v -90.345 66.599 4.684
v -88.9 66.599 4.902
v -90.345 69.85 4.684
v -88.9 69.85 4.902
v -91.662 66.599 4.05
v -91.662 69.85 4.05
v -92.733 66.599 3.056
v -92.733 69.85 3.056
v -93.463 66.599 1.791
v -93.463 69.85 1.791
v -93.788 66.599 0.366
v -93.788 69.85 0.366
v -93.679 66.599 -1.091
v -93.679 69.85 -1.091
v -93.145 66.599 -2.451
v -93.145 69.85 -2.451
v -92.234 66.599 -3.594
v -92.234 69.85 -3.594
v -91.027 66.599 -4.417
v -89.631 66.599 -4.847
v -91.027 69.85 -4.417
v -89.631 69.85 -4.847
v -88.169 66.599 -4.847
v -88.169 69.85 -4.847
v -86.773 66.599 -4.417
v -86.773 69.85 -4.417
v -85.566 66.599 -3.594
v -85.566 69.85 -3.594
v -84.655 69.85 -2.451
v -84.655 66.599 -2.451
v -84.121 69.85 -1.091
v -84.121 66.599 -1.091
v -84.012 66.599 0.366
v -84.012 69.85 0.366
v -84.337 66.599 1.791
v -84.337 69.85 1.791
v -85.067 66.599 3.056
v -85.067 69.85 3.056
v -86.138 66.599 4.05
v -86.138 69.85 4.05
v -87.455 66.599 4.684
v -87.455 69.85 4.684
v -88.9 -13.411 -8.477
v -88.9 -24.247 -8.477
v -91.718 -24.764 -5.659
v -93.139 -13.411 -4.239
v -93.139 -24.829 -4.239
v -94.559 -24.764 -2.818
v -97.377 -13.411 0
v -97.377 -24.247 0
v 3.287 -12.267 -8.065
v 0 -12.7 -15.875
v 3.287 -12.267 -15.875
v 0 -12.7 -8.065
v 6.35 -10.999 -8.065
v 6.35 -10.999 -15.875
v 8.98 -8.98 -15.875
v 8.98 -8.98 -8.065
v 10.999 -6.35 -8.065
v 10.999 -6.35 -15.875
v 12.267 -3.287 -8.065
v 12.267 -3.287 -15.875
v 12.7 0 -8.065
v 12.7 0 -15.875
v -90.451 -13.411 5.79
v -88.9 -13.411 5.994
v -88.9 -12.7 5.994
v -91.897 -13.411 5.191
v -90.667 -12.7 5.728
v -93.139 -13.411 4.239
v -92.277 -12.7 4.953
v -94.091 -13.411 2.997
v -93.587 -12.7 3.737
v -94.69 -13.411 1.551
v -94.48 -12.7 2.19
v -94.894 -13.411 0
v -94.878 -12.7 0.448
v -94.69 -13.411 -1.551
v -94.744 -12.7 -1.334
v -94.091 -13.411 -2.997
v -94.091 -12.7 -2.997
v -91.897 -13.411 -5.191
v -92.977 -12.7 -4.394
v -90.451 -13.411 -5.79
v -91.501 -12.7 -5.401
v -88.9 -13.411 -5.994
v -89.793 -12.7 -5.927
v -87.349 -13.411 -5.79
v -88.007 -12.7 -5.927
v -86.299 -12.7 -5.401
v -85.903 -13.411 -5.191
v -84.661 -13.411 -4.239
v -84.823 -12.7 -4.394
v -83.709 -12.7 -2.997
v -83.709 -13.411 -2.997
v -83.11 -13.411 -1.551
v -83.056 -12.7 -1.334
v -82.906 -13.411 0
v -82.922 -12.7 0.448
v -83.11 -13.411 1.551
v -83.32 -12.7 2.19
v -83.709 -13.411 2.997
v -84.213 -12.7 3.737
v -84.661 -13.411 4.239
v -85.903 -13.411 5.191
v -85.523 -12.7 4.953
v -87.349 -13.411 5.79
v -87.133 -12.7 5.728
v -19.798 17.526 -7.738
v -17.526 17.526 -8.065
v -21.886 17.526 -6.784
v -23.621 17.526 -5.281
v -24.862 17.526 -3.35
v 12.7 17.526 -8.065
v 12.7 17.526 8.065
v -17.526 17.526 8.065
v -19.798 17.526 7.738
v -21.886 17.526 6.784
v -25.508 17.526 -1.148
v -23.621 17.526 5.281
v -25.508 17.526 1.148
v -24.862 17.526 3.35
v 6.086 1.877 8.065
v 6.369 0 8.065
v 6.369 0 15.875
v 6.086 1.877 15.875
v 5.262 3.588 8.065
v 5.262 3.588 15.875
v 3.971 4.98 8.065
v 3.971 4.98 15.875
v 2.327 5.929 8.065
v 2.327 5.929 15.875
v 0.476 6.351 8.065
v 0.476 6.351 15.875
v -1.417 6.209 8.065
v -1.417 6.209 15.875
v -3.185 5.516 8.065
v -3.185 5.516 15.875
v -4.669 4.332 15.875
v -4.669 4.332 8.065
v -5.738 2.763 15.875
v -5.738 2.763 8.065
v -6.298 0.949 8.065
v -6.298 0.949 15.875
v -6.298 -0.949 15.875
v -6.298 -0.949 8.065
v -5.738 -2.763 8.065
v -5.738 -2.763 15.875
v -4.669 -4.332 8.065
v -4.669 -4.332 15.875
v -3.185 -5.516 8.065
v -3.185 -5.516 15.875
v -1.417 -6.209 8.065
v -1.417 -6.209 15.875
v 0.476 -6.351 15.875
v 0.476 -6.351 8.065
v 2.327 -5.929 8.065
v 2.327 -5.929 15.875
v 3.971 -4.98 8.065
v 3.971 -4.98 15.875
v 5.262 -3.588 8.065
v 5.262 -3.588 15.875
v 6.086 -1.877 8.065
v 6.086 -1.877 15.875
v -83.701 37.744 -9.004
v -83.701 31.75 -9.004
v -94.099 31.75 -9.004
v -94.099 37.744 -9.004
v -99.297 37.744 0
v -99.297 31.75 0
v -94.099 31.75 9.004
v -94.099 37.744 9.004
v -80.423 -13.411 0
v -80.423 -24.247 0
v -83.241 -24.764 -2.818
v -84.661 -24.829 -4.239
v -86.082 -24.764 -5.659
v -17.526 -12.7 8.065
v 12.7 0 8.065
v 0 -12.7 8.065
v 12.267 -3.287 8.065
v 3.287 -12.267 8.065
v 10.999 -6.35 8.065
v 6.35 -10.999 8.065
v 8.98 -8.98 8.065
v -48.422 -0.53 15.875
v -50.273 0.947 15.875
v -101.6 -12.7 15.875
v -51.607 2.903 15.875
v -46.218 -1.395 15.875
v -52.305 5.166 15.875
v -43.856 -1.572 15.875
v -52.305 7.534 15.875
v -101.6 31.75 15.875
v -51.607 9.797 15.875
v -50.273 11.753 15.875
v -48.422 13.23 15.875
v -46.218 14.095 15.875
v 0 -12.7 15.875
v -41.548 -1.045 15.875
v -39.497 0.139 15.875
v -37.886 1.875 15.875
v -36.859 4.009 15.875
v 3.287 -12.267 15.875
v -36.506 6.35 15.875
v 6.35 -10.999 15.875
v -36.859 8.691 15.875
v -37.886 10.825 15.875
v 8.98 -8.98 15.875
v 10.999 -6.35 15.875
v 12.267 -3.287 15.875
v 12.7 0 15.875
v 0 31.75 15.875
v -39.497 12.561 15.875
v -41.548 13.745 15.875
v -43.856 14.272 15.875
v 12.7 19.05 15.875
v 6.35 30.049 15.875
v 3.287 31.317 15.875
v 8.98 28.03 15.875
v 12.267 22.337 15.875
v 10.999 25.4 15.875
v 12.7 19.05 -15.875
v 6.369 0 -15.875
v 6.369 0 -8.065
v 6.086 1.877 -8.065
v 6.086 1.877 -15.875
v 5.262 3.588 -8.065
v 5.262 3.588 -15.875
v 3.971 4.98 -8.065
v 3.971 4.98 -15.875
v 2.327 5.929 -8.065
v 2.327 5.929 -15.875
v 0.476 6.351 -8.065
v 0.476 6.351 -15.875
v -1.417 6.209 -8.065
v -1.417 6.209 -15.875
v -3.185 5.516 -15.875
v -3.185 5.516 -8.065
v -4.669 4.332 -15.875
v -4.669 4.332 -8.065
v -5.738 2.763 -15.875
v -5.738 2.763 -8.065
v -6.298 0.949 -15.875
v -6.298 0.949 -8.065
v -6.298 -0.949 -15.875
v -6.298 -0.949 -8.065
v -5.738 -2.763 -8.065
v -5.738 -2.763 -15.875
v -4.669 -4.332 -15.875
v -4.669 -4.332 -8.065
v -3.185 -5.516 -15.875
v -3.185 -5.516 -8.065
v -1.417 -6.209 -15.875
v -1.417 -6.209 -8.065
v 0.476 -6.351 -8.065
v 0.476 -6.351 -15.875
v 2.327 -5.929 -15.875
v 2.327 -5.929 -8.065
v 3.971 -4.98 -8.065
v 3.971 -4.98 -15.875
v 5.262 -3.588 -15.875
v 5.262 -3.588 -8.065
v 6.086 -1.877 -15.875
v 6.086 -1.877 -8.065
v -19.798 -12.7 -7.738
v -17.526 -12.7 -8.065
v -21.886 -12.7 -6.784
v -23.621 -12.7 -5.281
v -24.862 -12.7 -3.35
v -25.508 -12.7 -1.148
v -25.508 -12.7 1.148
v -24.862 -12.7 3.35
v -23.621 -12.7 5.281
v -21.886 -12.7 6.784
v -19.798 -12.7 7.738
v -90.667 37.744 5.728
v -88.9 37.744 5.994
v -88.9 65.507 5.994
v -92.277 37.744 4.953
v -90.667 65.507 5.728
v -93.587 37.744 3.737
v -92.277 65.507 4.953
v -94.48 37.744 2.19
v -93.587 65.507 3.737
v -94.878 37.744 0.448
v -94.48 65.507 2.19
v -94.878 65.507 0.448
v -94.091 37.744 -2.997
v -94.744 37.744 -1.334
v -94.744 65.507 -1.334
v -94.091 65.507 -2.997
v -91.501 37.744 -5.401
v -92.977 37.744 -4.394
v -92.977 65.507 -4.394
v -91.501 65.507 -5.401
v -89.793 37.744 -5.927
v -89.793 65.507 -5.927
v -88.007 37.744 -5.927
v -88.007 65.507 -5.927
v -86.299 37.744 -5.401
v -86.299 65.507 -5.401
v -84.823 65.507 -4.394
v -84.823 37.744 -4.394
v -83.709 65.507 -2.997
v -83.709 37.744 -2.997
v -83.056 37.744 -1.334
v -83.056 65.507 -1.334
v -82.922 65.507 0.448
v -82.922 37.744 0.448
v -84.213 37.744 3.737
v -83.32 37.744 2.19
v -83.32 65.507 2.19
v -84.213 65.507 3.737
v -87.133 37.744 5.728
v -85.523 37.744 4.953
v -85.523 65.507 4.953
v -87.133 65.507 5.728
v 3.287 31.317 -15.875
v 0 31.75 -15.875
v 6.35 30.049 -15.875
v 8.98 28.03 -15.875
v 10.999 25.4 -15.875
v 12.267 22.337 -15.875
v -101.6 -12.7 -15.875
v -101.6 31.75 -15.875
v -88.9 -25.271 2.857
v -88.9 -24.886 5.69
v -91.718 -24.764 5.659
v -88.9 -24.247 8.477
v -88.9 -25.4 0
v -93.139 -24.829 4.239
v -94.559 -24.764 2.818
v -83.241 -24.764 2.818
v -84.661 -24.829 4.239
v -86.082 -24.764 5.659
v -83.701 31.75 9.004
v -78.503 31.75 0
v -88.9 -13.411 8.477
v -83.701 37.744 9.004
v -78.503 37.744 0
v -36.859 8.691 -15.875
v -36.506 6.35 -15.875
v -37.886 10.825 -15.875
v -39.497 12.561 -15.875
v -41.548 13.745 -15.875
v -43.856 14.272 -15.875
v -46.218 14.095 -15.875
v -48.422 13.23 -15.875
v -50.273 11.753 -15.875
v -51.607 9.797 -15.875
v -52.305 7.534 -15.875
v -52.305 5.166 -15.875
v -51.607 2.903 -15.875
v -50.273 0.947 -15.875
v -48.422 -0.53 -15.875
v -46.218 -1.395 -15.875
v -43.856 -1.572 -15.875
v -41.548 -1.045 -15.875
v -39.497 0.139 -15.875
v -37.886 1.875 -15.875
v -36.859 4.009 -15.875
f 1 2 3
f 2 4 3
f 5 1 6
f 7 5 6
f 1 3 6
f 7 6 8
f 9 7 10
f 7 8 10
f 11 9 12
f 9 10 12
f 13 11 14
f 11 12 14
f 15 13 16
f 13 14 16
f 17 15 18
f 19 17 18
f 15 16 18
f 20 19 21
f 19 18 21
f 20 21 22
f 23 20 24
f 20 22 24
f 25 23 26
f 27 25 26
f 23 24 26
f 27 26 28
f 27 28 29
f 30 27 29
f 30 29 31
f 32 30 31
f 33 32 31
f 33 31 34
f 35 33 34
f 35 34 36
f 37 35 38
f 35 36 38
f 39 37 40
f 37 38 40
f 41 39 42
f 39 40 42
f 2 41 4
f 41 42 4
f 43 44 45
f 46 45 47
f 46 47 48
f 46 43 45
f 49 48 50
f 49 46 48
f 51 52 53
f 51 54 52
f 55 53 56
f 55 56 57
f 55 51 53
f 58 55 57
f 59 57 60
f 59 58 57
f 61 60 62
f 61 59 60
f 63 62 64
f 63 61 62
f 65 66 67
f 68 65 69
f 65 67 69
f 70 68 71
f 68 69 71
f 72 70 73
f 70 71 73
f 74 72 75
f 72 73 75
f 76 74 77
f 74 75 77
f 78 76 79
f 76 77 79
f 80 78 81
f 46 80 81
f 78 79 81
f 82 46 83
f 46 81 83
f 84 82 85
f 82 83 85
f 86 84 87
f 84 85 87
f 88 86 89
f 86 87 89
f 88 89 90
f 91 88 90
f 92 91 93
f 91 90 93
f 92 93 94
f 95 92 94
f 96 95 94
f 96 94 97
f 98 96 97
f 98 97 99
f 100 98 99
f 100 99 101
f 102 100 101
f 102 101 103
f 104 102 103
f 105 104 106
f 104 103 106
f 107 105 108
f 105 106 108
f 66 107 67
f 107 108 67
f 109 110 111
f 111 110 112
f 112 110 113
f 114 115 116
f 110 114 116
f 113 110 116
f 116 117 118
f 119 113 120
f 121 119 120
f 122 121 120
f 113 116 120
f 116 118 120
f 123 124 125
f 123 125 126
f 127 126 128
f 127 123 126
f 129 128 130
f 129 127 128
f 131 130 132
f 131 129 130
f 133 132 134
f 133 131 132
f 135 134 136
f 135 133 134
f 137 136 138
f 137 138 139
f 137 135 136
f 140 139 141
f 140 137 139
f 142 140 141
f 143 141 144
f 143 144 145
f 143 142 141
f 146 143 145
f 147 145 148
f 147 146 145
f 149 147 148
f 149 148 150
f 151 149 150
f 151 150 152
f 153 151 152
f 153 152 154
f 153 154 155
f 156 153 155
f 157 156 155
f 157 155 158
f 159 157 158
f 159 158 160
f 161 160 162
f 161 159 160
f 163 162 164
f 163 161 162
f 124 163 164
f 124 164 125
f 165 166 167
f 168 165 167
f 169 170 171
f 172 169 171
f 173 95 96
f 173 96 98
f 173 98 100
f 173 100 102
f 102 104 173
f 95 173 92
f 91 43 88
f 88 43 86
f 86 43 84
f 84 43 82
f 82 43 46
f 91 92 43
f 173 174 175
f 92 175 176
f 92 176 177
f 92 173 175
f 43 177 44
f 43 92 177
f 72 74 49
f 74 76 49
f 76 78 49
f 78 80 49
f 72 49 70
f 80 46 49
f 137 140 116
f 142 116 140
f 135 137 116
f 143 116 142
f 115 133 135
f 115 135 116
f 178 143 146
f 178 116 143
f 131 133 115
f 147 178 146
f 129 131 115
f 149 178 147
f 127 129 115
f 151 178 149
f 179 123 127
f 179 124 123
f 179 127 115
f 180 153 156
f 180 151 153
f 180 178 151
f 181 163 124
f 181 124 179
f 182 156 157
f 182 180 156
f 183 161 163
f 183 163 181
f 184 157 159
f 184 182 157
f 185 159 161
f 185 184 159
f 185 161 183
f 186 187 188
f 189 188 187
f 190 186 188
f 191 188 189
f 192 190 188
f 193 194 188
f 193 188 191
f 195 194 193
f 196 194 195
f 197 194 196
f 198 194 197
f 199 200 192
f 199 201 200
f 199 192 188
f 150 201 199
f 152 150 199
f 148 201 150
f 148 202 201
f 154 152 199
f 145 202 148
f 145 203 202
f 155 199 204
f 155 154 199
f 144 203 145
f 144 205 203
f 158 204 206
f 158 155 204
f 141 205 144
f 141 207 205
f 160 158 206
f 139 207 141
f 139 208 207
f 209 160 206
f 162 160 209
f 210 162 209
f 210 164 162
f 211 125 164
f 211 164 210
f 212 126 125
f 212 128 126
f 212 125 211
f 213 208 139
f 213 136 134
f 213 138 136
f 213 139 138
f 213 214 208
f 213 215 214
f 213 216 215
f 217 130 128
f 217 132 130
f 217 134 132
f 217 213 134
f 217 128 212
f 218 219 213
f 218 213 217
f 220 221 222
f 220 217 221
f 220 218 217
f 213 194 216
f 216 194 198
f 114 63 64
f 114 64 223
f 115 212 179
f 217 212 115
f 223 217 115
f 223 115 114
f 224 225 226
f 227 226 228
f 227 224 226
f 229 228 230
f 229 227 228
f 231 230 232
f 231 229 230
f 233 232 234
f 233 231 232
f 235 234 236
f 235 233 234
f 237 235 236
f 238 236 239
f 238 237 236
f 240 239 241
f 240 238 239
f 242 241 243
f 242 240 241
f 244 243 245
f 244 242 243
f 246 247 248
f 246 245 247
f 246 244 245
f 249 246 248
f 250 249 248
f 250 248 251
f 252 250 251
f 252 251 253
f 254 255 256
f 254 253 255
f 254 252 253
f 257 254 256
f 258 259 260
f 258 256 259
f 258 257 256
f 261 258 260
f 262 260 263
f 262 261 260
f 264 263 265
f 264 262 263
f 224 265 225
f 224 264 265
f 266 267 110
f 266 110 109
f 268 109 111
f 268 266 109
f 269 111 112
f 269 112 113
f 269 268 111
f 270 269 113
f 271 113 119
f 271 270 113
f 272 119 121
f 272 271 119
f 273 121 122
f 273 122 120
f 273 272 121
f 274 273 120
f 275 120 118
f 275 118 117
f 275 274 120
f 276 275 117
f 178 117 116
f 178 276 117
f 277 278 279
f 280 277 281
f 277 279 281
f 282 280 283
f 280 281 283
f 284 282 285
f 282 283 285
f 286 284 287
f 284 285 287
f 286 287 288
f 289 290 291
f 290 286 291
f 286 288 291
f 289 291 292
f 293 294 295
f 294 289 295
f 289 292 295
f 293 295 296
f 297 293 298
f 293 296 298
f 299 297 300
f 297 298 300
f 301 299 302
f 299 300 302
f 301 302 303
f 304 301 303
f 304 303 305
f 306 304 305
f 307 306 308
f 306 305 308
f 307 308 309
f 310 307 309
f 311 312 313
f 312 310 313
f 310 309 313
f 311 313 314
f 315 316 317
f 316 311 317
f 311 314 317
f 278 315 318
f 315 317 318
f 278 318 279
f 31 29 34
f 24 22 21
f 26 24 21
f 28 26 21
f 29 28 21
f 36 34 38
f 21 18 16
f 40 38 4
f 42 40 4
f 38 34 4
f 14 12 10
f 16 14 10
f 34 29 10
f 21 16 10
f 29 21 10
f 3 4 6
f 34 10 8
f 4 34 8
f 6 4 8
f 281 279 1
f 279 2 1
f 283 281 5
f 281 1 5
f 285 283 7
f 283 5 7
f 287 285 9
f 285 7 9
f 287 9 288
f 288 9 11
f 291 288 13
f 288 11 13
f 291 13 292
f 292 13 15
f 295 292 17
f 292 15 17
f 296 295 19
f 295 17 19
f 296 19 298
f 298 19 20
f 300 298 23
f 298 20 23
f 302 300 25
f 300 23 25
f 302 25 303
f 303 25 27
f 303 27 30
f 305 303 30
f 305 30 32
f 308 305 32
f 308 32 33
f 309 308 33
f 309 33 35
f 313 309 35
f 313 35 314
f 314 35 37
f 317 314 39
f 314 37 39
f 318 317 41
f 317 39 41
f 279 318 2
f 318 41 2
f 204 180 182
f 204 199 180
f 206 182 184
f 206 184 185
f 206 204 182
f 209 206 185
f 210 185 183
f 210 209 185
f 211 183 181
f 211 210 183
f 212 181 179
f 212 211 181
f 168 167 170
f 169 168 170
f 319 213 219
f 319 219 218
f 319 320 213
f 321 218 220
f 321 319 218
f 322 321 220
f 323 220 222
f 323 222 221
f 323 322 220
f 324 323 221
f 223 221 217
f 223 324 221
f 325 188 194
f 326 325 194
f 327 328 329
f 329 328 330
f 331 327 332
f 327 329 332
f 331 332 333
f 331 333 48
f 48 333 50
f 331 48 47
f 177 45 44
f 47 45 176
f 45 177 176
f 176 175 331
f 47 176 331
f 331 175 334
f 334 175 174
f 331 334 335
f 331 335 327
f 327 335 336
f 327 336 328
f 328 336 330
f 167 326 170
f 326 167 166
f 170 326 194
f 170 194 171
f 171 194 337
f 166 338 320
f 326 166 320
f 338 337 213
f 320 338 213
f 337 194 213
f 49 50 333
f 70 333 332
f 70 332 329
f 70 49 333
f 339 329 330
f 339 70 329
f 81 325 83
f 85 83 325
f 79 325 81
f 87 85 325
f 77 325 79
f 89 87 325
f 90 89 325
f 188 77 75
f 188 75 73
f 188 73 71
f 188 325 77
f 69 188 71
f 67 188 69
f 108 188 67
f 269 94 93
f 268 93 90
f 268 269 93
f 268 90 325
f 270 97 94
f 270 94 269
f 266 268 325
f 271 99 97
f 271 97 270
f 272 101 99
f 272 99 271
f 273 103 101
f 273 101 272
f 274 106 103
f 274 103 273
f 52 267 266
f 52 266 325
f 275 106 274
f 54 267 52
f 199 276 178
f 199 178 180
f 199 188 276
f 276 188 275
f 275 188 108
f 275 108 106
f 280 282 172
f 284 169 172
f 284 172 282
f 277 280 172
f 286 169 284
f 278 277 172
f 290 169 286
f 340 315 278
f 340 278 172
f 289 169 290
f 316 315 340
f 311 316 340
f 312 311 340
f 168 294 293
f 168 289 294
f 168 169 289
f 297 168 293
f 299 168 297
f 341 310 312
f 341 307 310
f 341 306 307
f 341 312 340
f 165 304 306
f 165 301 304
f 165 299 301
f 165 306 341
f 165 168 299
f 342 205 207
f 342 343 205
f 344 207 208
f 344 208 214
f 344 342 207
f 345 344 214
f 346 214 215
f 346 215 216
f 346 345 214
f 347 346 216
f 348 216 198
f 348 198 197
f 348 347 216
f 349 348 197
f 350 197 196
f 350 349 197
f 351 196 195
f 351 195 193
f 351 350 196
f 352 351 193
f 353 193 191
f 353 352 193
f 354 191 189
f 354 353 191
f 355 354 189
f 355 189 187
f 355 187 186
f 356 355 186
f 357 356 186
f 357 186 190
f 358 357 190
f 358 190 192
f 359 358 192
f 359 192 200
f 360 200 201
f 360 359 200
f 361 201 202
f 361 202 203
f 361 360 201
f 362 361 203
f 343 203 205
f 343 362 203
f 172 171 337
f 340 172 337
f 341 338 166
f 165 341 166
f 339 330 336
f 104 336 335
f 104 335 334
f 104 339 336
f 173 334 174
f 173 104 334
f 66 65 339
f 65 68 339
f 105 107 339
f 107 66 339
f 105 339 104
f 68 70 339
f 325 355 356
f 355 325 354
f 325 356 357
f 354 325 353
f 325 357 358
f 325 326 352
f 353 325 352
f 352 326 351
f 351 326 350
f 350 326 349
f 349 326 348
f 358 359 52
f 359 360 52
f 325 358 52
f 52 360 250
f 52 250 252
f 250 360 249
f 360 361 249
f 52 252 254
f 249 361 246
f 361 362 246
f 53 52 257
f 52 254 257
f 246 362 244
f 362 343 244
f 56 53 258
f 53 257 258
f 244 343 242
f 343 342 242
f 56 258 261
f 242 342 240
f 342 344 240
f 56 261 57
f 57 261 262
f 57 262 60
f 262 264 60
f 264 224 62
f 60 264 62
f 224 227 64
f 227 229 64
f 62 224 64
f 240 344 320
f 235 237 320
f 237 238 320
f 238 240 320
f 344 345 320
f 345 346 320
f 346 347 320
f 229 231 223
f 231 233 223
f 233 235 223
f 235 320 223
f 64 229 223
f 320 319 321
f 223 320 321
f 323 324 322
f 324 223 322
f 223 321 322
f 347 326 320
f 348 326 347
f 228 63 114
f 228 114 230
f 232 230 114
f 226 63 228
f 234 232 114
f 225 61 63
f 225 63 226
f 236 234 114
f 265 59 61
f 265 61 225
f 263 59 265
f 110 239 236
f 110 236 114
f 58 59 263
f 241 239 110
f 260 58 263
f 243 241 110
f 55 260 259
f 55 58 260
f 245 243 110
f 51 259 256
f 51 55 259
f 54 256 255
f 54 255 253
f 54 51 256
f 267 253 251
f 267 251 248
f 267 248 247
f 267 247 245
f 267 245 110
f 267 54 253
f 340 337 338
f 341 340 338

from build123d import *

# Parameters (mm, degrees)
SKETCH11_W         = 114.3
SKETCH11_H         = 44.45
SKETCH11_R         = 6.36905
SKETCH11_R_2       = 7.94385
EXTRUDE3_DEPTH     = 15.875
CUT_EXTRUDE1_DEPTH = 30.226
FILLET1_R          = 12.7
EXTRUDE4_DEPTH     = 5.9944
SKETCH15_R         = 24.22520922
CUT_EXTRUDE2_DEPTH = 12.9888


with BuildPart() as part:
    # Sketch11 → Extrude3 (new body, symmetric)
    with BuildSketch(Plane.XY):
        with Locations((-44.45, 9.525)):
            Rectangle(SKETCH11_W, SKETCH11_H)
        Circle(SKETCH11_R, mode=Mode.SUBTRACT)
        with Locations((-44.45, 6.35)):
            Circle(SKETCH11_R_2, mode=Mode.SUBTRACT)
    extrude(amount=EXTRUDE3_DEPTH, both=True)

    # Sketch12 → Cut-Extrude1 (cut)
    with BuildSketch(Plane.XZ.offset(12.7)):
        with BuildLine():
            Line((-17.526, 8.0645), (12.7, 8.0645))
            Line((12.7, 8.0645), (12.7, -8.0645))
            Line((12.7, -8.0645), (-17.526, -8.0645))
            ThreePointArc((-17.526, -8.0645), (-25.5905, 0), (-17.526, 8.0645))
        make_face()
    extrude(amount=-CUT_EXTRUDE1_DEPTH, mode=Mode.SUBTRACT)

    # Fillet1
    fillet1_edges = [part.edges().sort_by_distance(p)[0] for p in [
        (12.7, -12.7, -11.96975),
        (12.7, 31.75, 0),
        (12.7, -12.7, 11.96975),
    ]]
    fillet(fillet1_edges, radius=FILLET1_R)

    # Sketch13 → Extrude4 (add)
    with BuildSketch(Plane(origin=(0, 31.75, 0), x_dir=(1, 0, 0), z_dir=(0, 1, 0))):
        Polygon((-78.502729942, 0), (-83.701364971, 9.0043), (-94.098635029, 9.0043), (-99.297270058, 0), (-94.098635029, -9.0043), (-83.701364971, -9.0043), align=None)
    extrude(amount=EXTRUDE4_DEPTH)

    # Sketch14 → Revolve2 (revolve)
    with BuildSketch(Plane.XY, mode=Mode.PRIVATE) as revolve2_sk:
        with BuildLine():
            Line((-93.8022, 66.5988), (-93.8022, 69.85))
            Line((-93.8022, 69.85), (-88.9, 69.85))
            Line((-88.9, 69.85), (-88.9, -25.4))
            ThreePointArc((-88.9, -25.4), (-102.250110486, -22.456892404), (-113.12520922, -14.1732))
            Line((-113.12520922, -14.1732), (-113.12520922, -13.4112))
            Line((-113.12520922, -13.4112), (-94.8944, -13.4112))
            Line((-94.8944, -13.4112), (-94.8944, 65.5066))
            Line((-94.8944, 65.5066), (-93.8022, 66.5988))
        make_face()
    revolve(revolve2_sk.sketch.rotate(Axis((-88.9, 71.228986791, 0), (0, -1, 0)), 270), axis=Axis((-88.9, 71.228986791, 0), (0, -1, 0)))  # turned: the seam where the file's is

    # Sketch15 → Cut-Extrude2 (cut, through all)
    with BuildSketch(Plane(origin=(0, -13.4112, 0), x_dir=(1, 0, 0), z_dir=(0, 1, 0))):
        with Locations((-88.9, 0)):
            Circle(SKETCH15_R)
        Polygon((-88.9, 8.477361778), (-97.377361778, 0), (-88.9, -8.477361778), (-80.422638222, 0), align=None, mode=Mode.SUBTRACT)
    extrude(amount=-CUT_EXTRUDE2_DEPTH, mode=Mode.SUBTRACT)


solid = part.part
